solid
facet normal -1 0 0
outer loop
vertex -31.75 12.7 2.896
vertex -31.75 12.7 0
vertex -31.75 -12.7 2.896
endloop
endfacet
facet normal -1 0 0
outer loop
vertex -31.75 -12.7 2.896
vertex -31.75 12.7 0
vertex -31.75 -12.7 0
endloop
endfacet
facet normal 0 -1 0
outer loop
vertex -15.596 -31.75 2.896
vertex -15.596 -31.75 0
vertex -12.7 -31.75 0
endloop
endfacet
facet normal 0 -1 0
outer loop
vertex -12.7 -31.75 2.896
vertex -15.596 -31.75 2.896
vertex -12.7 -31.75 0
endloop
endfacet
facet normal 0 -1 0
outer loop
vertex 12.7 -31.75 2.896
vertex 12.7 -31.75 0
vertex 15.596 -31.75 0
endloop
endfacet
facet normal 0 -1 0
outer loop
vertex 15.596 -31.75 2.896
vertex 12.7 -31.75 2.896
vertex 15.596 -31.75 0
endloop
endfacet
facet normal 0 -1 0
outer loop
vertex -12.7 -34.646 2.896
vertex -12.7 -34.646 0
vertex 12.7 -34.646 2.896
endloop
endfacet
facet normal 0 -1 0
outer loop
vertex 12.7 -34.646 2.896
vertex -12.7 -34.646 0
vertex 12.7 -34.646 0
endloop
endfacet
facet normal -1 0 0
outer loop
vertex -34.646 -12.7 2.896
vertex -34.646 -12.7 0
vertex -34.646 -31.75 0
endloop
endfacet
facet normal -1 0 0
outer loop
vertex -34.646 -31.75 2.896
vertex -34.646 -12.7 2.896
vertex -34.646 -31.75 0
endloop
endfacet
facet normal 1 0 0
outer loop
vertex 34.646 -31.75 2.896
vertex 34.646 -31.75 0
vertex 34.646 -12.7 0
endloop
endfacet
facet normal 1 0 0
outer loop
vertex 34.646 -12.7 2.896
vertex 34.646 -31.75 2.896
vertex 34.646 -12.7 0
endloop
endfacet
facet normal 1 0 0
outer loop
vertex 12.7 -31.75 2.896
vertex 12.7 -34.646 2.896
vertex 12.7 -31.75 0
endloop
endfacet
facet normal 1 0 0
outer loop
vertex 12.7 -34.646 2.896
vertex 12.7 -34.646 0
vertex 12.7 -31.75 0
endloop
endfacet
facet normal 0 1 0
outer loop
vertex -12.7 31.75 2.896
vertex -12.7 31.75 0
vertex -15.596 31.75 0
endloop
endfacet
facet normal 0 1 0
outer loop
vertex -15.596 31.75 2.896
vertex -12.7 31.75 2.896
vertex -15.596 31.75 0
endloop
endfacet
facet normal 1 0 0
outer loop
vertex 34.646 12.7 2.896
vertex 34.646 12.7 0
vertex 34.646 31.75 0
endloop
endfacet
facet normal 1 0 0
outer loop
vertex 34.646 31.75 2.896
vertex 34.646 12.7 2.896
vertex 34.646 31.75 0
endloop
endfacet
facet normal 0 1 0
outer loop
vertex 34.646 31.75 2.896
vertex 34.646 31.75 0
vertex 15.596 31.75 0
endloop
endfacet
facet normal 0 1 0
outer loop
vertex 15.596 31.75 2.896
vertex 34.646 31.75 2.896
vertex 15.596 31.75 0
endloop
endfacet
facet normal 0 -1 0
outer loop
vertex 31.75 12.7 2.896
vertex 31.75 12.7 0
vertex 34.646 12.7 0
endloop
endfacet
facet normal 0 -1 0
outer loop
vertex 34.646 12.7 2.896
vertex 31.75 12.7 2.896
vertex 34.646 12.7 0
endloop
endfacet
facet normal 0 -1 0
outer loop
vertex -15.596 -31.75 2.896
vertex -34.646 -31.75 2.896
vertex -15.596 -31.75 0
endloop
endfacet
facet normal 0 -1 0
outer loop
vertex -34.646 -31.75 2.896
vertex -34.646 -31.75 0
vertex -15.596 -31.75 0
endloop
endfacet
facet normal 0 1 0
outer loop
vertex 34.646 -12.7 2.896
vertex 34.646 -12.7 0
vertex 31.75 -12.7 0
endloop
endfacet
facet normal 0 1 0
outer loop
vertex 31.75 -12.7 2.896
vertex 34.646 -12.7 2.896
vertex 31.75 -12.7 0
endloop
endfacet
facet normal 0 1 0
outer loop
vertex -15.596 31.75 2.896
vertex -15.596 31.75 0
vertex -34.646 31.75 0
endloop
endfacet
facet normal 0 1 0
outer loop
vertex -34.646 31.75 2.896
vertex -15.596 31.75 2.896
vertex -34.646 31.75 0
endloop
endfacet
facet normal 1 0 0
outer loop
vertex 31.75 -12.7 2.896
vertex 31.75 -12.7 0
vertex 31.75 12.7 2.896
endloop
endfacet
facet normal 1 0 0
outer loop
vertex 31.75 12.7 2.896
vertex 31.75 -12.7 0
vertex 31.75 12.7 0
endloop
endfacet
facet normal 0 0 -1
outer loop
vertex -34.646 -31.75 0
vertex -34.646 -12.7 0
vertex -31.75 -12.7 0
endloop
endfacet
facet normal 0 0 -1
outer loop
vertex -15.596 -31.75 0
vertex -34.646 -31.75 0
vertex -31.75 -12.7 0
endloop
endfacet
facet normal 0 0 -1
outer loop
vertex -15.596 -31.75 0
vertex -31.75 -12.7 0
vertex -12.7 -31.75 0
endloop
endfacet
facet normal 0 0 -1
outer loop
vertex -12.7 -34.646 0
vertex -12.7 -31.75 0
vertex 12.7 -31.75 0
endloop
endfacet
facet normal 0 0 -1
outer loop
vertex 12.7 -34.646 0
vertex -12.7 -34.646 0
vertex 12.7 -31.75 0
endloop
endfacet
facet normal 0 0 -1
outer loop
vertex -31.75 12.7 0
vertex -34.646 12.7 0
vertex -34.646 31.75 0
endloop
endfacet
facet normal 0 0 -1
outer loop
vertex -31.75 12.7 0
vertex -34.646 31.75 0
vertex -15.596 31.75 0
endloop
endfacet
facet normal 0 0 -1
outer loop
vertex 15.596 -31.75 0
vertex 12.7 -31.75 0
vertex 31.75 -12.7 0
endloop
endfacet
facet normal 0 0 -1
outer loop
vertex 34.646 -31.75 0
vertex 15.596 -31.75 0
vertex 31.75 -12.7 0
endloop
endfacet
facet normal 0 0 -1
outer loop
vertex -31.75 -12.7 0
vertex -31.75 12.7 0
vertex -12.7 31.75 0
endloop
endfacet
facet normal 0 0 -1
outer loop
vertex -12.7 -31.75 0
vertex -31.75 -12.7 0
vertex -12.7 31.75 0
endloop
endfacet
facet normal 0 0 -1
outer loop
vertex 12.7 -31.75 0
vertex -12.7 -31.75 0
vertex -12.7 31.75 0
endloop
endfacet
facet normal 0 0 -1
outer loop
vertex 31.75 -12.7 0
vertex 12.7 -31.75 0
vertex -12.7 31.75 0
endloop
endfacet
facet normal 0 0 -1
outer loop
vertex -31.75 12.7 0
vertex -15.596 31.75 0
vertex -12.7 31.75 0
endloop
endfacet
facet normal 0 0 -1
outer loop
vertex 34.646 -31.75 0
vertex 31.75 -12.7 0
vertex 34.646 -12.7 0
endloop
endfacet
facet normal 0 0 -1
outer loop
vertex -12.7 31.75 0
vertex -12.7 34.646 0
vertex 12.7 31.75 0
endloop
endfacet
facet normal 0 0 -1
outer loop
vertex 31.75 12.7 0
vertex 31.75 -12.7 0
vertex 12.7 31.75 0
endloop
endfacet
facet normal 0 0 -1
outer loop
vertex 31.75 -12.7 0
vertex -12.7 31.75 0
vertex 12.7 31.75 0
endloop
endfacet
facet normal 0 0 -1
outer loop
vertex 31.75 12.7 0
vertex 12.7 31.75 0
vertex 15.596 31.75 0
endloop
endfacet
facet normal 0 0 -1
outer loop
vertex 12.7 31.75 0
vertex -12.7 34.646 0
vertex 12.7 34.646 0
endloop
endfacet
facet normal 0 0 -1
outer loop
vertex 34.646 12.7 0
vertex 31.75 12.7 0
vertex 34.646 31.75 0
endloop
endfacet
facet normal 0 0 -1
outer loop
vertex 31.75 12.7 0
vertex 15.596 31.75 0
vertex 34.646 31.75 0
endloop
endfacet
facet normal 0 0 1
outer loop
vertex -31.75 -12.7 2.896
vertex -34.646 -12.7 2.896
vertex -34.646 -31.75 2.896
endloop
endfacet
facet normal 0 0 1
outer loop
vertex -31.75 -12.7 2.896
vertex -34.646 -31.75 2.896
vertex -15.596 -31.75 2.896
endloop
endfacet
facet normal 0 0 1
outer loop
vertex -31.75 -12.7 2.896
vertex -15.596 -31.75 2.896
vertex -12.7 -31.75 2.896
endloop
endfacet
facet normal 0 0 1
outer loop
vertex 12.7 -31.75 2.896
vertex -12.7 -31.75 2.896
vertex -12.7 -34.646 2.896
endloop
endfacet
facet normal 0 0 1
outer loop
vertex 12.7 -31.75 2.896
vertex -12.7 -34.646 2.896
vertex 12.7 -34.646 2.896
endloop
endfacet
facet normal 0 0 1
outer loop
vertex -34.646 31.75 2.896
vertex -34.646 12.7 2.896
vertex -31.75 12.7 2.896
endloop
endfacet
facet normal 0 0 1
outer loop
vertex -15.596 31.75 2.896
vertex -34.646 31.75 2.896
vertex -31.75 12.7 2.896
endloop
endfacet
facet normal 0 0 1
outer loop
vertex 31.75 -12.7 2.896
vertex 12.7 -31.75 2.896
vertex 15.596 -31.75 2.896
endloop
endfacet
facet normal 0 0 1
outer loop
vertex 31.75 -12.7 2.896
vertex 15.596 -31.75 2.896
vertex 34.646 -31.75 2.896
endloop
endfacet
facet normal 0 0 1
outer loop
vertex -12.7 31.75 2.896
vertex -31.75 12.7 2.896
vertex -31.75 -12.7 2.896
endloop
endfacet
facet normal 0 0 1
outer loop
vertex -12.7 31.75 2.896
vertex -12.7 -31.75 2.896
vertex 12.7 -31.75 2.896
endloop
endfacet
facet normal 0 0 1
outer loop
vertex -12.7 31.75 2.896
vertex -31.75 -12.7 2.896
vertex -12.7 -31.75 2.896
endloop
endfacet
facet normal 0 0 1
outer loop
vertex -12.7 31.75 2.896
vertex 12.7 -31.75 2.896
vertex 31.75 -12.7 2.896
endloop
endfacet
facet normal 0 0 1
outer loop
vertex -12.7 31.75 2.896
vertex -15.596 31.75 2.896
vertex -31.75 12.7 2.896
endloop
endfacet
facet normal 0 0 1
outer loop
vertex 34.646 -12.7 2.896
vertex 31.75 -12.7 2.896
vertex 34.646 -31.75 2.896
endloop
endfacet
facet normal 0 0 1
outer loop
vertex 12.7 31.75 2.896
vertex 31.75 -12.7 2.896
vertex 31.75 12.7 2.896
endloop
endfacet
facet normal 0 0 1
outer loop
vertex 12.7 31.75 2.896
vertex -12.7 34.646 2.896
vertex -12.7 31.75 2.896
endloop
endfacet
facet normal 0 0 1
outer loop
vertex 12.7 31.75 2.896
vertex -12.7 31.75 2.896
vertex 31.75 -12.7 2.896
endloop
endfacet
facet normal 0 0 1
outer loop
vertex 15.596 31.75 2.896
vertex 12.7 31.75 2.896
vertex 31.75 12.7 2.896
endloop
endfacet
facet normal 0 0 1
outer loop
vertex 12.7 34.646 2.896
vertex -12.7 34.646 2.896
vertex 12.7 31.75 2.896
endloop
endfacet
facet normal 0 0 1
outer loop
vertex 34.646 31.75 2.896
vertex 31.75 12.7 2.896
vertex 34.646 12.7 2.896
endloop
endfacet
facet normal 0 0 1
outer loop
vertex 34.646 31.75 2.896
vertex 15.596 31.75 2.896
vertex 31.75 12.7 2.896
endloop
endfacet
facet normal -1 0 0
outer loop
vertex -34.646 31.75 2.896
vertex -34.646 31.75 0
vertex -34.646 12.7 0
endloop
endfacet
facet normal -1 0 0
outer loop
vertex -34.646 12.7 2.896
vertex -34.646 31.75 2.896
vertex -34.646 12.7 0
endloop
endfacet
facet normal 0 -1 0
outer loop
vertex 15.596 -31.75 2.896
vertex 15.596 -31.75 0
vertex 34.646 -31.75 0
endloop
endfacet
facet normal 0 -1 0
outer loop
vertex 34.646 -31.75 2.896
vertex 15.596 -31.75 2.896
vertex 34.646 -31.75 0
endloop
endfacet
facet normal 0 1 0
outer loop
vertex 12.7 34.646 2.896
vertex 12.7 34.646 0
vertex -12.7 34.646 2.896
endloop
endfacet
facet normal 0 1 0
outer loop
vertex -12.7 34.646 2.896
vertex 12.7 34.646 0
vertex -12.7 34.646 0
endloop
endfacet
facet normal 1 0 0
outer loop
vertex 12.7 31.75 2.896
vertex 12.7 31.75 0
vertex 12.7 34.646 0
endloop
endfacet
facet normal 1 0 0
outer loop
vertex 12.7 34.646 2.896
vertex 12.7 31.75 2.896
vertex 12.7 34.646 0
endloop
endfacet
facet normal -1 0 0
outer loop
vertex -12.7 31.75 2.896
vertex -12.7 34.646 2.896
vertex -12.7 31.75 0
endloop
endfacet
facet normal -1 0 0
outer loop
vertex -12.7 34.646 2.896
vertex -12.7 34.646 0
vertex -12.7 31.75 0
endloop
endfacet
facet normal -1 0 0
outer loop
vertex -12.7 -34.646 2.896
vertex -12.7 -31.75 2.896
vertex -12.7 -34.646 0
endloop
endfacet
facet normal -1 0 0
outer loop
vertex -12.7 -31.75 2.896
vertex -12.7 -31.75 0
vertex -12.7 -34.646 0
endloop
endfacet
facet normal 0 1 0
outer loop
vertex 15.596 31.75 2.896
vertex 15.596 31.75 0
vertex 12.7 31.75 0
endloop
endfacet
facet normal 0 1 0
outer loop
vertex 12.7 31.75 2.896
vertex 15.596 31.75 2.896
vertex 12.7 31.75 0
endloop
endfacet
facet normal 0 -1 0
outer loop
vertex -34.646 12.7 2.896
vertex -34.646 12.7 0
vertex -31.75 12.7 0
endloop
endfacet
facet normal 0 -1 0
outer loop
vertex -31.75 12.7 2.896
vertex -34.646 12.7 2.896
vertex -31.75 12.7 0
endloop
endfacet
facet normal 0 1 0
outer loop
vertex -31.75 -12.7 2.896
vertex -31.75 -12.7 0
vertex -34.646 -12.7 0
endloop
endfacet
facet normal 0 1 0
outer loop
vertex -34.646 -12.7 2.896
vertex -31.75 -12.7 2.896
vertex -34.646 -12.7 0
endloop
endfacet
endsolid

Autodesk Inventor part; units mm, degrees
ref_plane "YZ Plane" through (0, 0, 0) normal (1, 0, 0) x (0, 1, 0)
ref_plane "XZ Plane" through (0, 0, 0) normal (0, 1, 0) x (-1, 0, 0)
ref_plane "XY Plane" through (0, 0, 0) normal (0, 0, 1) x (1, 0, 0)
sketch "Sketch1" plane through (0, 0, 0) normal (0, 0, 1) x (1, 0, 0)
  line L0 (12.7, -31.75) -> (15.5956, -31.75)
  line L1 (15.5956, -31.75) -> (34.6456, -31.75)
  line L2 (34.6456, -31.75) -> (34.6456, -12.7)
  line L3 (34.6456, -12.7) -> (31.75, -12.7)
  line L4 (31.75, -12.7) -> (31.75, 12.7)
  line L5 (31.75, 12.7) -> (34.6456, 12.7)
  line L6 (34.6456, 12.7) -> (34.6456, 31.75)
  line L7 (34.6456, 31.75) -> (15.5956, 31.75)
  line L8 (15.5956, 31.75) -> (12.7, 31.75)
  line L9 (12.7, 31.75) -> (12.7, 34.6456)
  line L10 (12.7, 34.6456) -> (-12.7, 34.6456)
  line L11 (-12.7, 34.6456) -> (-12.7, 31.75)
  line L12 (-12.7, 31.75) -> (-15.5956, 31.75)
  line L13 (-15.5956, 31.75) -> (-34.6456, 31.75)
  line L14 (-34.6456, 31.75) -> (-34.6456, 12.7)
  line L15 (-34.6456, 12.7) -> (-31.75, 12.7)
  line L16 (-31.75, 12.7) -> (-31.75, -12.7)
  line L17 (-31.75, -12.7) -> (-34.6456, -12.7)
  line L18 (-34.6456, -12.7) -> (-34.6456, -31.75)
  line L19 (-34.6456, -31.75) -> (-15.5956, -31.75)
  line L20 (-15.5956, -31.75) -> (-12.7, -31.75)
  line L21 (-12.7, -31.75) -> (-12.7, -34.6456)
  line L22 (-12.7, -34.6456) -> (12.7, -34.6456)
  line L23 (12.7, -34.6456) -> (12.7, -31.75)
  point P0 (0, 0)
extrude "Extrusion1" add sketch "Sketch1" along normal blind 2.8956
properties part number "outside_box_left_right" material "Polycarbonate, Clear"
